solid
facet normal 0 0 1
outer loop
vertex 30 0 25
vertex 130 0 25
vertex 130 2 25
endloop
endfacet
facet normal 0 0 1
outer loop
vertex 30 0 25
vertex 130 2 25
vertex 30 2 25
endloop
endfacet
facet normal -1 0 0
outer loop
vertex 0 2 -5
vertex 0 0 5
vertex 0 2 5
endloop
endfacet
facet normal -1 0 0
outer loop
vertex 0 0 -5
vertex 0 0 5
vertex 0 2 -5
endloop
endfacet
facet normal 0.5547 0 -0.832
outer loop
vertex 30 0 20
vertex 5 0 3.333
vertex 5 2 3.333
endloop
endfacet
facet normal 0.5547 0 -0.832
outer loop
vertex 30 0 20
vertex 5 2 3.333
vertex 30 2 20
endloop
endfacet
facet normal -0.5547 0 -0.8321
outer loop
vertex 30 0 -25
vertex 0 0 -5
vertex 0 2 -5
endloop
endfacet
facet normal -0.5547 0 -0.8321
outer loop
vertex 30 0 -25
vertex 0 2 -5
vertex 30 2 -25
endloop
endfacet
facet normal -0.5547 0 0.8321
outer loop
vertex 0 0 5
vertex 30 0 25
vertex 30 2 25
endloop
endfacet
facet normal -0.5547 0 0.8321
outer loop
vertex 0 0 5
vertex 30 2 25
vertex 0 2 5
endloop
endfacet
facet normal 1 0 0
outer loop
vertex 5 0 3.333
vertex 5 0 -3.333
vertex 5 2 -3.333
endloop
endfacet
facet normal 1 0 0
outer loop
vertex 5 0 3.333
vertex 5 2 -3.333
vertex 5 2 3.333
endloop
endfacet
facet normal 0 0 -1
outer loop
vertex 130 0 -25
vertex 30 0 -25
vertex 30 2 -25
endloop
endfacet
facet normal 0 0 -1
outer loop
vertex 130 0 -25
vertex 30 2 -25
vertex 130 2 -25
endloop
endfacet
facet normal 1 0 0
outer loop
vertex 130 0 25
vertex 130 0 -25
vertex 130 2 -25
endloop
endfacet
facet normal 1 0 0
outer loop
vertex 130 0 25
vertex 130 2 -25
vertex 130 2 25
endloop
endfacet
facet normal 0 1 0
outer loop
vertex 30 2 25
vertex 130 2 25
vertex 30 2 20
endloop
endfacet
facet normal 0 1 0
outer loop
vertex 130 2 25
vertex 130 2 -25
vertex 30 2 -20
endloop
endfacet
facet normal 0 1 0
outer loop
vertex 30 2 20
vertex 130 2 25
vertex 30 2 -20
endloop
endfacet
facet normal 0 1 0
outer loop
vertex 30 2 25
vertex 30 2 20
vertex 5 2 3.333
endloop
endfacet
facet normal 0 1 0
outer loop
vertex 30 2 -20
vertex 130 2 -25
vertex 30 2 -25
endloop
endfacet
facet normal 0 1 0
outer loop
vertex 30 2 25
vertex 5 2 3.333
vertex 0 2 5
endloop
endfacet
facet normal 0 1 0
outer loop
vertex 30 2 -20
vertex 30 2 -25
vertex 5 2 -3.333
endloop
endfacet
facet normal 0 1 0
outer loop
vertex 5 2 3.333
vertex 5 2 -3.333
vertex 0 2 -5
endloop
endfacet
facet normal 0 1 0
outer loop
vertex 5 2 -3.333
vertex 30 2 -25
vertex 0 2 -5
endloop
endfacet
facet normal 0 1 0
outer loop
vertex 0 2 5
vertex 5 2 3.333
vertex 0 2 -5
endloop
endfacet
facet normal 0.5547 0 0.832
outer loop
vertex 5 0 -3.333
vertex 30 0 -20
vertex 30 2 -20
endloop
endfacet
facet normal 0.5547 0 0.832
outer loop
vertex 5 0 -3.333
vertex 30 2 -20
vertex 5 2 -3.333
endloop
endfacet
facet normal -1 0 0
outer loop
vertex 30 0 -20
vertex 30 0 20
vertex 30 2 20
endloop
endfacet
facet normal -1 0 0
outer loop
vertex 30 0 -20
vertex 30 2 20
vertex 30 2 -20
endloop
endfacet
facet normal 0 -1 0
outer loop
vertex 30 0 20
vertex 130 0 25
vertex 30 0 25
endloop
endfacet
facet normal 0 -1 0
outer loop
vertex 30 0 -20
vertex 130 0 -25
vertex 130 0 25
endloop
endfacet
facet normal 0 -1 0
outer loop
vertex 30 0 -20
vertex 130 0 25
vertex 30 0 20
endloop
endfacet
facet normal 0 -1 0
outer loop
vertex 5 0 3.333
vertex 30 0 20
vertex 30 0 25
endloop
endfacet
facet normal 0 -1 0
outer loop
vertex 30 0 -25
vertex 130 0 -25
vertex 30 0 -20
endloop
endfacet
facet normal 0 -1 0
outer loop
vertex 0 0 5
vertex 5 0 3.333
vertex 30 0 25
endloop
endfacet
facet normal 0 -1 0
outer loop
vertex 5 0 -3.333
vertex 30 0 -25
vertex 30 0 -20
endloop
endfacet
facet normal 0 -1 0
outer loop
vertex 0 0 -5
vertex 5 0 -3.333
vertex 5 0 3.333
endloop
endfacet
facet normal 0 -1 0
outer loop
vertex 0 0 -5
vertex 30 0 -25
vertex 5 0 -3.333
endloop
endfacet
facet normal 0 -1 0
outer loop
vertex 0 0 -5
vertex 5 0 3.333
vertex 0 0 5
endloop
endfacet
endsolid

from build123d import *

# Parameters (mm, degrees)
BOSS_EXTRUDE1_DEPTH = 2


with BuildPart() as part:
    # Sketch1 → Boss-Extrude1 (new body)
    with BuildSketch(Plane(origin=(0, 0, 0), x_dir=(1, 0, 0), z_dir=(0, 1, 0))):
        Polygon((0, 5), (30, 25), (130, 25), (130, -25), (30, -25), (0, -5), align=None)
        Polygon((30, -20), (30, 20), (5, 3.333333333), (5, -3.333333333), align=None, mode=Mode.SUBTRACT)
    extrude(amount=BOSS_EXTRUDE1_DEPTH)


solid = part.part
